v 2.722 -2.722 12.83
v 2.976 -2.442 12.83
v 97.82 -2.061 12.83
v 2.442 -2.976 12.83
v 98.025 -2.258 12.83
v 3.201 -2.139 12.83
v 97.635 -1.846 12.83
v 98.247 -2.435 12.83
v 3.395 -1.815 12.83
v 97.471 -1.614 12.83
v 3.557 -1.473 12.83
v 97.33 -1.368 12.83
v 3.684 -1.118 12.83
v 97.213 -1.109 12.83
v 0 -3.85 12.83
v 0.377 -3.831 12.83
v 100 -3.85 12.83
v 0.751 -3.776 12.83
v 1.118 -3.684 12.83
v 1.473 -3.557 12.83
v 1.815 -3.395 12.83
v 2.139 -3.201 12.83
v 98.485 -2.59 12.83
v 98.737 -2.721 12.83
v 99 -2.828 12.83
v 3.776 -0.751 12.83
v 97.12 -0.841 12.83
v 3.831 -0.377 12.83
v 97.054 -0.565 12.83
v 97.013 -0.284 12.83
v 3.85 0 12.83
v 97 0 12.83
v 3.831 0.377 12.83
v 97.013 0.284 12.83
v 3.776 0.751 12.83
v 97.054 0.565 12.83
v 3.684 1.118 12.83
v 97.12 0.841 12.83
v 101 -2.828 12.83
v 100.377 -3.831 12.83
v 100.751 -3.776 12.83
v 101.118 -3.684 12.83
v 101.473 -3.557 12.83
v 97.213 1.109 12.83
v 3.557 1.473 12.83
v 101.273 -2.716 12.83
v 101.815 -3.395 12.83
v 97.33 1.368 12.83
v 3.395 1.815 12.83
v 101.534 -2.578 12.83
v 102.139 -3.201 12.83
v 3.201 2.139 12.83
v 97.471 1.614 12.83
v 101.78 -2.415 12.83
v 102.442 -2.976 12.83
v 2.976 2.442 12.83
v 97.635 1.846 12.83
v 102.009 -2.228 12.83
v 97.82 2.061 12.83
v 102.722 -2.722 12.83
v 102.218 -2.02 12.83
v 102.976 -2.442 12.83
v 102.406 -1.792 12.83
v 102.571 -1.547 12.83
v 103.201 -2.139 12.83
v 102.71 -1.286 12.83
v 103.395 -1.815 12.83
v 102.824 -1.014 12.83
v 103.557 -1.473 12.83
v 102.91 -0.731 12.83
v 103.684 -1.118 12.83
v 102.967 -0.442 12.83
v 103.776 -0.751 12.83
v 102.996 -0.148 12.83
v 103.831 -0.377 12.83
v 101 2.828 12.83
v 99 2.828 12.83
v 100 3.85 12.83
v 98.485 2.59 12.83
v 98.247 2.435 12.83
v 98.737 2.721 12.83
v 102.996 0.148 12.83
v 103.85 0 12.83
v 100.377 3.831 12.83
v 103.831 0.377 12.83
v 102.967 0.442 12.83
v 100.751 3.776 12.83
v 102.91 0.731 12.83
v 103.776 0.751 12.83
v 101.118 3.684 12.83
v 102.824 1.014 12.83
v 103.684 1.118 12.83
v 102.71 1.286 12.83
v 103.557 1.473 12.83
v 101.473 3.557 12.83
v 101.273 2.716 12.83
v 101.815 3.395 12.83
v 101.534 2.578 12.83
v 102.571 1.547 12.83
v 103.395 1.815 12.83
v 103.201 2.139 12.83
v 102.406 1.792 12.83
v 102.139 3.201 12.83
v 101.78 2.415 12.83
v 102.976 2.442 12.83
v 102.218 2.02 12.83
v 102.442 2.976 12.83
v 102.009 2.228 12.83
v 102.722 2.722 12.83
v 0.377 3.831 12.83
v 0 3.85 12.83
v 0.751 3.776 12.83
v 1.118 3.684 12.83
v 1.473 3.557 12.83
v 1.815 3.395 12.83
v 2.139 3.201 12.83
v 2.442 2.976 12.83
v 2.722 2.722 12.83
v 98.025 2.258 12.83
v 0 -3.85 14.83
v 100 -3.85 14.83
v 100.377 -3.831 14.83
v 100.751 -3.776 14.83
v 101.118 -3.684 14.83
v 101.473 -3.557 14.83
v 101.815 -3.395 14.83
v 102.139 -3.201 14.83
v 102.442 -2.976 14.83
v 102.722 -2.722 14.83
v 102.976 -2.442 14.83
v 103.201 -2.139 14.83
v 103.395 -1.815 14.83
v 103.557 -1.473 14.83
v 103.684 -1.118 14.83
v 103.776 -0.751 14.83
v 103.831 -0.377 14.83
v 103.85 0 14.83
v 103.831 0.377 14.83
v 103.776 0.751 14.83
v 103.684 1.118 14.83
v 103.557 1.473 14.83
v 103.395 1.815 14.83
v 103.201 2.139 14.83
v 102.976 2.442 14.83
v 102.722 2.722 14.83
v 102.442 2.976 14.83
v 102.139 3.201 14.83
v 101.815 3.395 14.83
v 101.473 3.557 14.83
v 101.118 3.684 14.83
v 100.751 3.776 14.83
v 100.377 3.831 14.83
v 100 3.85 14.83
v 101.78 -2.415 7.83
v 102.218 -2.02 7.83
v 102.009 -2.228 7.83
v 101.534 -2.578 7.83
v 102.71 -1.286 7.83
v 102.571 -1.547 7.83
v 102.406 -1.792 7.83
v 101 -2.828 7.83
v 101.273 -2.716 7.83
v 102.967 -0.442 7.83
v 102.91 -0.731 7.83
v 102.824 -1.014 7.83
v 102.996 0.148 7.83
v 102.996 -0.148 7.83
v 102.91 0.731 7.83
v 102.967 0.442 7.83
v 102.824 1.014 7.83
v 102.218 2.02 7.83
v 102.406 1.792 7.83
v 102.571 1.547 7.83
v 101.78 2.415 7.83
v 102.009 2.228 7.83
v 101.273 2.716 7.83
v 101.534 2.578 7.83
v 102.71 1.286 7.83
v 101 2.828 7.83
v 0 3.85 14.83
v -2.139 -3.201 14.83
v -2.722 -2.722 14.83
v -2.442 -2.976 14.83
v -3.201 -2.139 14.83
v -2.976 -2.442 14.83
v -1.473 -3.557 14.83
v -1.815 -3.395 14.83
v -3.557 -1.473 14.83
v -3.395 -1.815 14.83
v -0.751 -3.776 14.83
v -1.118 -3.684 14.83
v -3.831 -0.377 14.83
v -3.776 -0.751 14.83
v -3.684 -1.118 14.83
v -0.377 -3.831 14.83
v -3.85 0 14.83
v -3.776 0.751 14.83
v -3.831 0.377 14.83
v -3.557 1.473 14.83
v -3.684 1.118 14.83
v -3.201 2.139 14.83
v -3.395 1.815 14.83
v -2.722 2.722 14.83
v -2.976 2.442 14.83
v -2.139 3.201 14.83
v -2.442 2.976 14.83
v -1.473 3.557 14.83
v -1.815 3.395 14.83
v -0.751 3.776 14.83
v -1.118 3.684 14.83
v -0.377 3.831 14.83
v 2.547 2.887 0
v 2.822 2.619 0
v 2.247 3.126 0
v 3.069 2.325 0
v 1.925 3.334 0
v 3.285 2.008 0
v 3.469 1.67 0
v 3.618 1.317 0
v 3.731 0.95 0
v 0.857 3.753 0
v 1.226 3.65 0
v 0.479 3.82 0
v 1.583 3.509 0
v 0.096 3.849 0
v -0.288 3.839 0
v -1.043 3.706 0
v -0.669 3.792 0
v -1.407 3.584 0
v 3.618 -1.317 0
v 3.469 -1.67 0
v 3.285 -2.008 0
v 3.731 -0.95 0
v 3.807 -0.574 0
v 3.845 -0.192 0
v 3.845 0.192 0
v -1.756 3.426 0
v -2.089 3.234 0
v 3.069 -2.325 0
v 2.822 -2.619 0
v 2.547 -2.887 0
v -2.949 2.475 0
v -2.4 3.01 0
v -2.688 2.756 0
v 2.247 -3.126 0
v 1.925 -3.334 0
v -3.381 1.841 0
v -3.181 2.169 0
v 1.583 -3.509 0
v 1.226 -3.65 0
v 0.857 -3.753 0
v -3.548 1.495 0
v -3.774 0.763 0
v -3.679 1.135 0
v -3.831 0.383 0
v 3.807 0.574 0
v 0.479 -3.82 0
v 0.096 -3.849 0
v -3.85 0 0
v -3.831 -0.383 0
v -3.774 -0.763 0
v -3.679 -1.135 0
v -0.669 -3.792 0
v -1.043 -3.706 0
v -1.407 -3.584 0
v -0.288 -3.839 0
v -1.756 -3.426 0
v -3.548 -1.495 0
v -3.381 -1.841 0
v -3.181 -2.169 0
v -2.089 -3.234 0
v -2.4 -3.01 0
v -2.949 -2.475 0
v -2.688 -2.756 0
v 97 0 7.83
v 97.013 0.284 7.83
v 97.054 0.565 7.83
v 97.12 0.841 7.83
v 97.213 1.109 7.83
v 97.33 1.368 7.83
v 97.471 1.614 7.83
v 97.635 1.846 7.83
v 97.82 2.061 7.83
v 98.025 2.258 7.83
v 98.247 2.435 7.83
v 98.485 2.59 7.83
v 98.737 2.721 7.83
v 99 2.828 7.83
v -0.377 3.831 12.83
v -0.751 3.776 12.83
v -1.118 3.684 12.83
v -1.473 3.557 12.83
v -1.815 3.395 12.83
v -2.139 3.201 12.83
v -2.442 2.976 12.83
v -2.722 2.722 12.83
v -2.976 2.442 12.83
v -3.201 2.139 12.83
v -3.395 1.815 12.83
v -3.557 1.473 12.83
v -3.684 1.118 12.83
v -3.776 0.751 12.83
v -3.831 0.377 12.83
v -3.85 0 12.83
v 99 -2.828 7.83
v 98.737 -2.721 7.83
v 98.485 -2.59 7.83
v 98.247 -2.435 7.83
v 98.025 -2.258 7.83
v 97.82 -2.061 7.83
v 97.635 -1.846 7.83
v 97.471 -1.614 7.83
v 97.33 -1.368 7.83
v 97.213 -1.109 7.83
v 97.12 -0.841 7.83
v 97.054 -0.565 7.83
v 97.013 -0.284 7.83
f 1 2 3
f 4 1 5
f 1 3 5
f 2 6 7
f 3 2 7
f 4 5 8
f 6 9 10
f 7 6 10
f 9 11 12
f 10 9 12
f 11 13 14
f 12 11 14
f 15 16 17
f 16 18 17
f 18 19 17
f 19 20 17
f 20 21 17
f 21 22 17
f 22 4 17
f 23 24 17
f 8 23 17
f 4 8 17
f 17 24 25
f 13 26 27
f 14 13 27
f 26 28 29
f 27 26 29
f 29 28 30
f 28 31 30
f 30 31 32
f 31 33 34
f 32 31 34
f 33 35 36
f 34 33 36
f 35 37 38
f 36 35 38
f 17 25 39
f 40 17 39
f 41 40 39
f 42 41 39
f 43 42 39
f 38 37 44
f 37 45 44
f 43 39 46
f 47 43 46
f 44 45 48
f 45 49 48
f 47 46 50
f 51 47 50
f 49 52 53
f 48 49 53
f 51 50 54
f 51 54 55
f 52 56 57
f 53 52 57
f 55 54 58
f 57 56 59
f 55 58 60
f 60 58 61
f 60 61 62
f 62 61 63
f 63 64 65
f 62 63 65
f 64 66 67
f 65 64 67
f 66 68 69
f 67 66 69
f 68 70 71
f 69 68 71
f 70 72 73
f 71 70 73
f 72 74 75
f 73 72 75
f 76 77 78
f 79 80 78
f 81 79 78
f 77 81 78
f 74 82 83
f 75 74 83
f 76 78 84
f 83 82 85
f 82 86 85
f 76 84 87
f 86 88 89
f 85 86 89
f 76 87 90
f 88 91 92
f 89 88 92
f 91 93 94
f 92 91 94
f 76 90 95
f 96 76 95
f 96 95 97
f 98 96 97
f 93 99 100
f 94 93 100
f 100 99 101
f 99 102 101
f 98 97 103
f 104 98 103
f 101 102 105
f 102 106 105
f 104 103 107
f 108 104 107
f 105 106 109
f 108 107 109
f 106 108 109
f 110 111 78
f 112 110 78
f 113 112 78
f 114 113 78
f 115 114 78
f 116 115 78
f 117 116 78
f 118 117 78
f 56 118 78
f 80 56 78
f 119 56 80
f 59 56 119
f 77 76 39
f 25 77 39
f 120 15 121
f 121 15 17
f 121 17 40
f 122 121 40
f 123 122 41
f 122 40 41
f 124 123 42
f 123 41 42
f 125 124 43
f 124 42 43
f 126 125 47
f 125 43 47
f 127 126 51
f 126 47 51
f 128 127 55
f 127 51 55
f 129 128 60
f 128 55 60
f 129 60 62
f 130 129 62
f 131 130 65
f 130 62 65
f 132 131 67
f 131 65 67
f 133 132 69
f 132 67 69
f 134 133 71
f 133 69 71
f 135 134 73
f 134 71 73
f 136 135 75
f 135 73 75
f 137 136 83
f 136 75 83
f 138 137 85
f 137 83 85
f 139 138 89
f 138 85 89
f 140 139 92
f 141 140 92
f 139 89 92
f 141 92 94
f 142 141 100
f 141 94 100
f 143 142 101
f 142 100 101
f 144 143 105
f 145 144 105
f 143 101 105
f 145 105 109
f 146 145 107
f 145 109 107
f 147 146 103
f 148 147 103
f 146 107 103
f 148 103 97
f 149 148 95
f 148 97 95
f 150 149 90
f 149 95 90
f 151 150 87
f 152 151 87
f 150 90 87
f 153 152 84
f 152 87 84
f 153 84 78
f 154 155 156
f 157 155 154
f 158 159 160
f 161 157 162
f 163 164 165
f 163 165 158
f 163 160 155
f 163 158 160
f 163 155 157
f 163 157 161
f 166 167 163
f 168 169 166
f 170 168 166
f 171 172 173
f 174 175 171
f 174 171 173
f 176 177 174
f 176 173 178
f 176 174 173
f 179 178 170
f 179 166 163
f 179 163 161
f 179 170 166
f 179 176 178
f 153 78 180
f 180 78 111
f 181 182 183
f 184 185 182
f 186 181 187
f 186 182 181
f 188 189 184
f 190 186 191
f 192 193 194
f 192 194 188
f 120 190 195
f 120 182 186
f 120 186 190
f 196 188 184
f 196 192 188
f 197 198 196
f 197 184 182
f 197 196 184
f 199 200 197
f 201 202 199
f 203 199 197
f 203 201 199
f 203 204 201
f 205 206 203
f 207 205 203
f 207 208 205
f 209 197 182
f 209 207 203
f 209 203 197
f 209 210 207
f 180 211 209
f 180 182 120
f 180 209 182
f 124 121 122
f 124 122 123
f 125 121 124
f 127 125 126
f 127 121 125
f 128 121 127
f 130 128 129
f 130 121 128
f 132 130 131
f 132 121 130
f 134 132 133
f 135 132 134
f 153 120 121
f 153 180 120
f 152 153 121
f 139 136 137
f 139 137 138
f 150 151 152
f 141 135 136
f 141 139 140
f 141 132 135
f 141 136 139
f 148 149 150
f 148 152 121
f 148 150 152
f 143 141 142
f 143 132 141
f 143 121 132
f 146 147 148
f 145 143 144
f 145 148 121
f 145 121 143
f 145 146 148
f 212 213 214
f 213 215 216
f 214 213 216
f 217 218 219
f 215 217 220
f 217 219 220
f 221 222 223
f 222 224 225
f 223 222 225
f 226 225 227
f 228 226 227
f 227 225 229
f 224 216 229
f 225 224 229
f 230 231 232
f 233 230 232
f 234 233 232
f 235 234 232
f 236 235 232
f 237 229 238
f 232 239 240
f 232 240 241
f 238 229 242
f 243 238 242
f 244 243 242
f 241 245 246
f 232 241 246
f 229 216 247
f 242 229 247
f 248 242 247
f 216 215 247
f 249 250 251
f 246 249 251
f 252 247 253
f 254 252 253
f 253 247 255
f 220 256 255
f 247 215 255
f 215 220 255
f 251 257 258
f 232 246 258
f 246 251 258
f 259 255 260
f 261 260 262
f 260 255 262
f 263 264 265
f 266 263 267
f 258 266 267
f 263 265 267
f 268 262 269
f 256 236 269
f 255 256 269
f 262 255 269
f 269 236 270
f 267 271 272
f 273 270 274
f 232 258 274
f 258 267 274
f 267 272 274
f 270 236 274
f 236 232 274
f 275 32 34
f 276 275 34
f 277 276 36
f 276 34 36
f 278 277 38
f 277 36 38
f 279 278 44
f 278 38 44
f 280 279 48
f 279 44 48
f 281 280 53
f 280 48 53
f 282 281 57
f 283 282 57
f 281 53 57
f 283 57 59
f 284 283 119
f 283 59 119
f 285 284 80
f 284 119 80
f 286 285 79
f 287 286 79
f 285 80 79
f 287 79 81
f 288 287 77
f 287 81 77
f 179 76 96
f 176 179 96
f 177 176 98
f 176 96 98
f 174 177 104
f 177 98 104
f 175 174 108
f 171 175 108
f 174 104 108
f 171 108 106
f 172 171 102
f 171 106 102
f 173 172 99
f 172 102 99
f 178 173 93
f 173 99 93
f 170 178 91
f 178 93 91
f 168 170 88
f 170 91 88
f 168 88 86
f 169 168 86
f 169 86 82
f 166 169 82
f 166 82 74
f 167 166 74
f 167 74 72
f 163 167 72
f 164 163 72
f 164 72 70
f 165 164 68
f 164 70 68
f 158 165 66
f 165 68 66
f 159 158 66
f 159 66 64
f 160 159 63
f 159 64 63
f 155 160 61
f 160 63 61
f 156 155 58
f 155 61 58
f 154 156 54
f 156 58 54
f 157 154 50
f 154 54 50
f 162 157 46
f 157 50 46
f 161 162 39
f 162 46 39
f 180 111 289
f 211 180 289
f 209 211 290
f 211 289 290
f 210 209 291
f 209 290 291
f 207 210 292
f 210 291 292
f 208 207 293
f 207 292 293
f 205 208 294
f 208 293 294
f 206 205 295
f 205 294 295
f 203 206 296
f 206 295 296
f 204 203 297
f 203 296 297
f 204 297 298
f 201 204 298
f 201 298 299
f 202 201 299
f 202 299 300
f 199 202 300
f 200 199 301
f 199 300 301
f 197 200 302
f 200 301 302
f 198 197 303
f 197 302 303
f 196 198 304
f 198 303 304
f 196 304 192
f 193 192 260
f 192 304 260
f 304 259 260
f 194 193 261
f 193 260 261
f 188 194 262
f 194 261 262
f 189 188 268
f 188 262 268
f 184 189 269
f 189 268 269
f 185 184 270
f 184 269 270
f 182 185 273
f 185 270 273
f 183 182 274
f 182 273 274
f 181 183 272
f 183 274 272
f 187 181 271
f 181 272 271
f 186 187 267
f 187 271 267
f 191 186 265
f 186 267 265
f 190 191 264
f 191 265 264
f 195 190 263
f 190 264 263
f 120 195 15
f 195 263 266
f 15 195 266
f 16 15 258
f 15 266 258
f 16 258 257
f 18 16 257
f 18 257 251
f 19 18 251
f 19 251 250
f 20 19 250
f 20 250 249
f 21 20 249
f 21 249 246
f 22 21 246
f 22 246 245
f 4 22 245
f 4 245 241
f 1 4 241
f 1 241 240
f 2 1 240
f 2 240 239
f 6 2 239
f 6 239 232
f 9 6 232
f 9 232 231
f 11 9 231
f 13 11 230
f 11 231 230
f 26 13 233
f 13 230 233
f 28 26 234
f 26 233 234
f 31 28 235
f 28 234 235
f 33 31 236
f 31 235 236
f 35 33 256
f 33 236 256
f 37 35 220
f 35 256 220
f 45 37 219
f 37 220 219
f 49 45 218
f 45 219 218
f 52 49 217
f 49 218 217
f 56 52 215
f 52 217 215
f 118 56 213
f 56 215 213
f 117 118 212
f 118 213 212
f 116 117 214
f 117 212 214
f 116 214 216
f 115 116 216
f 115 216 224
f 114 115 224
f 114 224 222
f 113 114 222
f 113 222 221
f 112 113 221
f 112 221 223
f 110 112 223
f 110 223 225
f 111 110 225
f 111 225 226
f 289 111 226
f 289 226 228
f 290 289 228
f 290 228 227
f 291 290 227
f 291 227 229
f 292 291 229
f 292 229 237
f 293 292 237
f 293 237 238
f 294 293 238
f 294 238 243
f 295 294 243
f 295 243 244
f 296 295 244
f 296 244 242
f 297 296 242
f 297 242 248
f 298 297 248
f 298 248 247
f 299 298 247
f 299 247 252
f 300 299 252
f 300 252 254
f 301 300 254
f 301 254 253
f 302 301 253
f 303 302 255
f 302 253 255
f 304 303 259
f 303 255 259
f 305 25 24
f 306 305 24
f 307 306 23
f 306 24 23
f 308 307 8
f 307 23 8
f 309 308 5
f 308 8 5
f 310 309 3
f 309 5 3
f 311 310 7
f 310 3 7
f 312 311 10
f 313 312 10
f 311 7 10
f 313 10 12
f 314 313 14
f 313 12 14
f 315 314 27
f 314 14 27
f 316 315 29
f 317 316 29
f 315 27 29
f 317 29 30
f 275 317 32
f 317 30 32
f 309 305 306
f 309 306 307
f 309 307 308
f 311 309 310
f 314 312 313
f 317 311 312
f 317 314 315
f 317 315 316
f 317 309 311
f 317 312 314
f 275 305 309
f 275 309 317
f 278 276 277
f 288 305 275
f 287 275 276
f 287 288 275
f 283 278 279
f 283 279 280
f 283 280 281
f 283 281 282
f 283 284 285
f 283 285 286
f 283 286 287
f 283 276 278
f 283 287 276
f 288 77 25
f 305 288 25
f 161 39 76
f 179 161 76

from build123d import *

# Parameters (mm, degrees)
SKETCH1_R           = 3.85
BOSS_EXTRUDE1_DEPTH = 12.83
SKETCH2_R           = 3.85
BOSS_EXTRUDE3_DEPTH = 2
BOSS_EXTRUDE5_DEPTH = 5


with BuildPart() as part:
    # Sketch1 → Boss-Extrude1 (new body)
    with BuildSketch(Plane.XY):
        with Locations(Location((0, 0, 0), (0, 0, 180))):
            Circle(SKETCH1_R)
    extrude(amount=BOSS_EXTRUDE1_DEPTH)

    # Sketch2 → Boss-Extrude3 (add)
    with BuildSketch(Plane.XY.offset(12.83)):
        with Locations((100, 0)):
            Circle(SKETCH2_R)
        with BuildLine():
            Line((100, 3.85), (0, 3.85))
            ThreePointArc((0, 3.85), (2.722361108, 2.722361108), (3.85, 0))
            ThreePointArc((3.85, 0), (2.722361108, -2.722361108), (0, -3.85))
            Line((0, -3.85), (100, -3.85))
            ThreePointArc((100, -3.85), (96.15, 0), (100, 3.85))
        make_face()
        with BuildLine():
            ThreePointArc((3.85, 0), (2.722361108, 2.722361108), (0, 3.85))
            Line((0, 3.85), (0, -3.85))
            ThreePointArc((0, -3.85), (2.722361108, -2.722361108), (3.85, 0))
        make_face()
        with BuildLine():
            Line((0, -3.85), (0, 3.85))
            ThreePointArc((0, 3.85), (-3.85, 0), (0, -3.85))
        make_face()
    extrude(amount=BOSS_EXTRUDE3_DEPTH)

    # Sketch3 → Boss-Extrude5 (add)
    with BuildSketch(Plane(origin=(0, 0, 12.83), x_dir=(-1, 0, 0), z_dir=(0, 0, -1))):
        with BuildLine():
            Line((-101, -2.828427125), (-101, 2.828427125))
            ThreePointArc((-101, 2.828427125), (-103, 0), (-101, -2.828427125))
        make_face()
        with BuildLine():
            ThreePointArc((-97, 0), (-97.550510257, 1.732050808), (-99, 2.828427125))
            Line((-99, 2.828427125), (-99, -2.828427125))
            ThreePointArc((-99, -2.828427125), (-97.550510257, -1.732050808), (-97, 0))
        make_face()
    extrude(amount=BOSS_EXTRUDE5_DEPTH)


solid = part.part
